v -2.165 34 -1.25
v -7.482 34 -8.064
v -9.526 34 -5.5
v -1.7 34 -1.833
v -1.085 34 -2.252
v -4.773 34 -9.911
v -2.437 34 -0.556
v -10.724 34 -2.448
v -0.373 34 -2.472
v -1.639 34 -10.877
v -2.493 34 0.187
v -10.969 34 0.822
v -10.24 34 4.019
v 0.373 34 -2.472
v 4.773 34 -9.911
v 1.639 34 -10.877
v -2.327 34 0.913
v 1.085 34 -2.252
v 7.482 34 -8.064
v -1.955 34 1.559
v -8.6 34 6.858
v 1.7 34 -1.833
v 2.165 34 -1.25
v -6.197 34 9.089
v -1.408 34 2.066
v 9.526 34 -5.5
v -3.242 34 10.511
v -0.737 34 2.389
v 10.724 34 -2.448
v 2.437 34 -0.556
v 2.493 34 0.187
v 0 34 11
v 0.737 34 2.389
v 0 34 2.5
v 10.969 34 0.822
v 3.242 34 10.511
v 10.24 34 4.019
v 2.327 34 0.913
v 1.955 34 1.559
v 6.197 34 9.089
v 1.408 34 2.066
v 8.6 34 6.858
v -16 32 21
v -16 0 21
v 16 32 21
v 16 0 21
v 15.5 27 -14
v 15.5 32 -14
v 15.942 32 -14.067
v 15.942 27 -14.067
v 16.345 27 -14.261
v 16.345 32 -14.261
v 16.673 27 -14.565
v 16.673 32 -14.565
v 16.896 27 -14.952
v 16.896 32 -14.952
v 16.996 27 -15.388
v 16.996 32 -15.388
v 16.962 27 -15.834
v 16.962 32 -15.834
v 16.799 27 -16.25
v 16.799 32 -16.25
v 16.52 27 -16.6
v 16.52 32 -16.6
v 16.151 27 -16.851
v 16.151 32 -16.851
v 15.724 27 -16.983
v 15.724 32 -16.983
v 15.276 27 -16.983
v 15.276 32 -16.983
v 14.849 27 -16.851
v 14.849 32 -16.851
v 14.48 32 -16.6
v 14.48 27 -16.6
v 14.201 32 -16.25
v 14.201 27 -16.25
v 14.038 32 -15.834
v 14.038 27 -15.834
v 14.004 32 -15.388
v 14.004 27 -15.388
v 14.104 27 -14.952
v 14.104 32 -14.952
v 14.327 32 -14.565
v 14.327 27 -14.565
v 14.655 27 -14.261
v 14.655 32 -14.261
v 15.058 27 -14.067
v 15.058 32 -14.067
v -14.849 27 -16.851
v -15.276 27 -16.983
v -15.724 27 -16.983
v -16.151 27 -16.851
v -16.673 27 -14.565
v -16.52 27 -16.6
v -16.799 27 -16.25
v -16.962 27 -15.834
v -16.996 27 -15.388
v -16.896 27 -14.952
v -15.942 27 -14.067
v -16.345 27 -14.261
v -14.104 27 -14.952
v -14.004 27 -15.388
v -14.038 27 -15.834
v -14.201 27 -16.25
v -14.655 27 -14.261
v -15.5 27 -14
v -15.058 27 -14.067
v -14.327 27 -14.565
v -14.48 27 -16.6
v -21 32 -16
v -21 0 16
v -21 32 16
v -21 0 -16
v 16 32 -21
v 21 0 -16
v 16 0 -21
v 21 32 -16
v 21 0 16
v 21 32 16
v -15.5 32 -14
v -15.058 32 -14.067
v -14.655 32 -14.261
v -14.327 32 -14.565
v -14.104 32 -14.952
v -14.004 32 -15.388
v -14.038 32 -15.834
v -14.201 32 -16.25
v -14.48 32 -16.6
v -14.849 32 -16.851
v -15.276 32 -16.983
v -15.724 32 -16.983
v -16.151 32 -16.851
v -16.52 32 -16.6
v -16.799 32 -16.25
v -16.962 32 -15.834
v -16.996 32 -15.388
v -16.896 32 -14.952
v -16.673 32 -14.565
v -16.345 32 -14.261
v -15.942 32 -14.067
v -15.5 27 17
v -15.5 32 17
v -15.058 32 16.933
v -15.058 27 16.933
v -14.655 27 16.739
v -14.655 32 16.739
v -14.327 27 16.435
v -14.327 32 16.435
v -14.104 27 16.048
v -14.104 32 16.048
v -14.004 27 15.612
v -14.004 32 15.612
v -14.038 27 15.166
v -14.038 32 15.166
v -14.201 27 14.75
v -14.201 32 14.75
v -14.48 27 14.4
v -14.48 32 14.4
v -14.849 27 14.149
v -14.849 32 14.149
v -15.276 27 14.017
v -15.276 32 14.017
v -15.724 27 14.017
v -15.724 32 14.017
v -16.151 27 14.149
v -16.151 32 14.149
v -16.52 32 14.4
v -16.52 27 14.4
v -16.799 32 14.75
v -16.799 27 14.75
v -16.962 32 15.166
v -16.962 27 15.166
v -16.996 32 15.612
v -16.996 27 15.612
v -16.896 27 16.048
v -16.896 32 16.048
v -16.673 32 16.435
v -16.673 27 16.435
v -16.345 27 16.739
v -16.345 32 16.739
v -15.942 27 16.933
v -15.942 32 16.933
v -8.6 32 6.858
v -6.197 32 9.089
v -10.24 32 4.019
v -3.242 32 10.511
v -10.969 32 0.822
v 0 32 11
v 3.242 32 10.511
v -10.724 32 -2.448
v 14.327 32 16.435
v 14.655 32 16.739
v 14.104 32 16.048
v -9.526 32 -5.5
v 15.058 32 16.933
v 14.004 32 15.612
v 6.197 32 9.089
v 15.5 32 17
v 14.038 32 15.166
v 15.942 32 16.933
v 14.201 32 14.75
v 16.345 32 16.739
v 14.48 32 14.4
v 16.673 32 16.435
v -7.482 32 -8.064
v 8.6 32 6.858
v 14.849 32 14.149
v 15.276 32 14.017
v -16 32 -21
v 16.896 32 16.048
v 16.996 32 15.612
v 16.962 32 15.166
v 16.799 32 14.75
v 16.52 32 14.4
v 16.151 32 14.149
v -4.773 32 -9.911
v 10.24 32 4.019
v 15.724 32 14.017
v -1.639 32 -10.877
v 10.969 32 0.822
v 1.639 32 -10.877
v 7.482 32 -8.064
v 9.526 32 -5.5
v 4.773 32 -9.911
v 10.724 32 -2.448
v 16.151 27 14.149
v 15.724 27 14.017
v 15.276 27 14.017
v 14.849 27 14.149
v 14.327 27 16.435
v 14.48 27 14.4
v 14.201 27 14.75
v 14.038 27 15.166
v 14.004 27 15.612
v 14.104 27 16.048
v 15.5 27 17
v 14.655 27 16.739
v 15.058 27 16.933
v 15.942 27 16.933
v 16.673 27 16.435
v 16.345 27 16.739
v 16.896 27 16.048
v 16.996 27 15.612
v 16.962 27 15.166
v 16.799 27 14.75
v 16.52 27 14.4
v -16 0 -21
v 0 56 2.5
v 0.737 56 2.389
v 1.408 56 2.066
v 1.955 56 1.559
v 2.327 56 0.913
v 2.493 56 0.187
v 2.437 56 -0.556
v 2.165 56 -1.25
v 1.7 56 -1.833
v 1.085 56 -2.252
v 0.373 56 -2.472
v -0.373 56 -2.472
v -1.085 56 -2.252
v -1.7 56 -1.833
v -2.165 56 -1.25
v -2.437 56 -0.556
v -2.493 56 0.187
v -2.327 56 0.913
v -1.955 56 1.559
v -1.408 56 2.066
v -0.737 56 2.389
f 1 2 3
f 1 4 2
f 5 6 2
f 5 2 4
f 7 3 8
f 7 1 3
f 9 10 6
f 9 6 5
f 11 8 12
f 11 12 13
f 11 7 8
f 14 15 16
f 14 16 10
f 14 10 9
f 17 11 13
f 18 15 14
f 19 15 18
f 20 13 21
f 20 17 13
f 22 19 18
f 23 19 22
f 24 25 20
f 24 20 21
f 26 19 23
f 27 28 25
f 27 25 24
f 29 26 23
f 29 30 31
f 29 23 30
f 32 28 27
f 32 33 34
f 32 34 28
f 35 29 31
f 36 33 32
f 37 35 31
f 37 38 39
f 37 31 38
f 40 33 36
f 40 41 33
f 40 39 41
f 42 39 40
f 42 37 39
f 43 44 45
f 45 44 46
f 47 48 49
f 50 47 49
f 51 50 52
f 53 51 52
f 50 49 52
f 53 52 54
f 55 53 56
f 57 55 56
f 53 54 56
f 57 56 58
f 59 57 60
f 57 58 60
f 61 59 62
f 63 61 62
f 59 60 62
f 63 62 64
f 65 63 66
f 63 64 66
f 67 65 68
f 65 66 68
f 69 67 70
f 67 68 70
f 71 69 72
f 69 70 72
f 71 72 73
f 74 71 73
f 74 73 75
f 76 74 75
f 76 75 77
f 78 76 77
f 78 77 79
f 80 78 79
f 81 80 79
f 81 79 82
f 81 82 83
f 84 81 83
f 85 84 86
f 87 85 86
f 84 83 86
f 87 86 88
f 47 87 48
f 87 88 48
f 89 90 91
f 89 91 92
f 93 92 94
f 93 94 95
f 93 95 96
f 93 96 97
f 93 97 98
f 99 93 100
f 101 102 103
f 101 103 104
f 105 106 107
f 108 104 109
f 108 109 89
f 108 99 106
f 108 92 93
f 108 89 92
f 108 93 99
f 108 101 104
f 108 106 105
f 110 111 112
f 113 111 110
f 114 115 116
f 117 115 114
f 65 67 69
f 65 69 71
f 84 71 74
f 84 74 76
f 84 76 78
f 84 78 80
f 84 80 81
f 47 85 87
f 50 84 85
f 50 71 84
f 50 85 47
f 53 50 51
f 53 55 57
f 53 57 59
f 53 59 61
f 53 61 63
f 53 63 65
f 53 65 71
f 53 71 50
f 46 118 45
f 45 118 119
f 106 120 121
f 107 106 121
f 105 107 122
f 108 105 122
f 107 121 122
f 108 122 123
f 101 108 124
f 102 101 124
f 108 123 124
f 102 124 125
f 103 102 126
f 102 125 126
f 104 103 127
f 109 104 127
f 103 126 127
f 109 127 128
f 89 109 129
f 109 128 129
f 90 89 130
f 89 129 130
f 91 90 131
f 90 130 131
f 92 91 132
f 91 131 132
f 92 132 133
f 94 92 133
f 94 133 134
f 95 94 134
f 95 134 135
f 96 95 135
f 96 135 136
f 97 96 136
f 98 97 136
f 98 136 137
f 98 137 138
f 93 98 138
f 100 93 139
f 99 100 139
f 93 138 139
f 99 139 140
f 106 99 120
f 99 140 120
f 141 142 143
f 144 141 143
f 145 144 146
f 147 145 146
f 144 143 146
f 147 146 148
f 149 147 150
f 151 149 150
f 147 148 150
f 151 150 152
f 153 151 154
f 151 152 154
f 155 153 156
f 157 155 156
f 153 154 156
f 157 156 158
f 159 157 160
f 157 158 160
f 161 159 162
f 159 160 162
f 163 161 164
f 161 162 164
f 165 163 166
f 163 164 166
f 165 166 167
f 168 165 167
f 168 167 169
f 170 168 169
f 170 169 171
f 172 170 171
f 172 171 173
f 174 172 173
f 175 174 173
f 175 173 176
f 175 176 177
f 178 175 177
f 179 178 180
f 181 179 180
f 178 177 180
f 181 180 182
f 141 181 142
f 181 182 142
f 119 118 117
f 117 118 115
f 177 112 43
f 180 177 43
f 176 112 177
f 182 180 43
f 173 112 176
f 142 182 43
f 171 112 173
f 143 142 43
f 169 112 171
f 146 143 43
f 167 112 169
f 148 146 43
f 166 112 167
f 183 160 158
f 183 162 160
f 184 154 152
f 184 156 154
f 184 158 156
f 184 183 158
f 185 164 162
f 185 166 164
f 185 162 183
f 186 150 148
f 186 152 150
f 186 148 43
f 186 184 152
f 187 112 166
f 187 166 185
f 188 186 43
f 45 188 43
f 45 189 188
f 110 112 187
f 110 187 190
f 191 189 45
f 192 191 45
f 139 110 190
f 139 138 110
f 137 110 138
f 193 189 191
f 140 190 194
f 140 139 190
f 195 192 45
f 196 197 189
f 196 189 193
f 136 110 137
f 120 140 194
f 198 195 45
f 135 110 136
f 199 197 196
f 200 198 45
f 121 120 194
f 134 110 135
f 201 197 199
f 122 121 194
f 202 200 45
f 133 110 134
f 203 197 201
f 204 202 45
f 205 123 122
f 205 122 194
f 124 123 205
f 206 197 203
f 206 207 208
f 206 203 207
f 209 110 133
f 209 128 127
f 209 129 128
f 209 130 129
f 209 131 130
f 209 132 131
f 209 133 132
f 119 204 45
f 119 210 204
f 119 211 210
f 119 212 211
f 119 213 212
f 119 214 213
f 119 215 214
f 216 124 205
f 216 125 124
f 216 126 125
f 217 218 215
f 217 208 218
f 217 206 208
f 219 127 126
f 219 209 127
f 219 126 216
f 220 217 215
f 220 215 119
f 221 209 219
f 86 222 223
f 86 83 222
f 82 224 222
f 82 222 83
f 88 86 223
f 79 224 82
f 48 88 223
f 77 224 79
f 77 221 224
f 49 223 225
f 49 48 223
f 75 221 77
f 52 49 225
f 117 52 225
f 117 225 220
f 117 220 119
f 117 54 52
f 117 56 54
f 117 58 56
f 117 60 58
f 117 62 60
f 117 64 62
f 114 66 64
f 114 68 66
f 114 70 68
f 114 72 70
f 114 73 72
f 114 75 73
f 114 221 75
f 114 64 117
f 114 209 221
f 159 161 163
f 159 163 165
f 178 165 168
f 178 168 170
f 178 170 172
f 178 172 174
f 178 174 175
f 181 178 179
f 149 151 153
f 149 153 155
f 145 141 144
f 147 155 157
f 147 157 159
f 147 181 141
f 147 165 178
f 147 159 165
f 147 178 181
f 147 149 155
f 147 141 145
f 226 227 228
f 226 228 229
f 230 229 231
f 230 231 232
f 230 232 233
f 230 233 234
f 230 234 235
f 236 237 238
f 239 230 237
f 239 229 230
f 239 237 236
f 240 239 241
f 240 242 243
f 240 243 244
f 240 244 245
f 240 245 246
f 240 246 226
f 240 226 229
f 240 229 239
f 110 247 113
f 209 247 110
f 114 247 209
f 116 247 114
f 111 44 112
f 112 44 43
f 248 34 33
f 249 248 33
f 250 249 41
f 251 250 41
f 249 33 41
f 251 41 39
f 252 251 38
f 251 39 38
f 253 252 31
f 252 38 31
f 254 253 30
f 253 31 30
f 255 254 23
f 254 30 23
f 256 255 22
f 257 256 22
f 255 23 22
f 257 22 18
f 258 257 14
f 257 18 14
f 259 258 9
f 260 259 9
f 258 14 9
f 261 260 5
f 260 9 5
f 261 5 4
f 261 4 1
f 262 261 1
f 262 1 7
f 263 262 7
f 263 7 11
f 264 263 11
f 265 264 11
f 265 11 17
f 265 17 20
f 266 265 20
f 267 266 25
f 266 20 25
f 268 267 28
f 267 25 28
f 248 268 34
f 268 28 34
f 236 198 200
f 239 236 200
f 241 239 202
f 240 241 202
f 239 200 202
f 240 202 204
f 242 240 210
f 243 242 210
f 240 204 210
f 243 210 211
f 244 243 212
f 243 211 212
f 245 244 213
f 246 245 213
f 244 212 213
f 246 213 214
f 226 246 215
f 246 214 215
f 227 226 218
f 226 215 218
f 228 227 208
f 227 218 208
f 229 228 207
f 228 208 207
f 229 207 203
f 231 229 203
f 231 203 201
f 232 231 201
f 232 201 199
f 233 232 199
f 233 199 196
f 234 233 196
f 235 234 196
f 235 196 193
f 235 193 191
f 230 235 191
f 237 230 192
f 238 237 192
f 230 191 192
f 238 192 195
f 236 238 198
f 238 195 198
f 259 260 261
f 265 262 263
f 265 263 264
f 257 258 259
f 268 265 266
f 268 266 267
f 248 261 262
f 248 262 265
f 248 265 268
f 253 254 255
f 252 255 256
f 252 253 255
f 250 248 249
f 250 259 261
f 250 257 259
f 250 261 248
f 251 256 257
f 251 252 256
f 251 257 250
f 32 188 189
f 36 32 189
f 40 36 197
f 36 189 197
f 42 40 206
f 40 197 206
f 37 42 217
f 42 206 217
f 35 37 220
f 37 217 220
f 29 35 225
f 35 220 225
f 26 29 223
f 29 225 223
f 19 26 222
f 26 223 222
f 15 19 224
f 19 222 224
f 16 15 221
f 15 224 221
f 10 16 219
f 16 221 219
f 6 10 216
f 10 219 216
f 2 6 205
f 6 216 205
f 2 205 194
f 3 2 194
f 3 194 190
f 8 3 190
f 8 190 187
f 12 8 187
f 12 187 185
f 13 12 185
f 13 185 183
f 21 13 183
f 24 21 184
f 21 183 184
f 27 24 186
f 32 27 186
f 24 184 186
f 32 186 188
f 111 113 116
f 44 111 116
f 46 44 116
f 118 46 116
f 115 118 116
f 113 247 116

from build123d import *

# Parameters (mm, degrees)
SKETCH1_W           = 42
SKETCH1_H           = 42
BOSS_EXTRUDE1_DEPTH = 32
SKETCH2_R           = 11
BOSS_EXTRUDE2_DEPTH = 2
SKETCH3_R           = 2.5
BOSS_EXTRUDE3_DEPTH = 22
SKETCH4_R           = 1.5
CUT_EXTRUDE1_DEPTH  = 5
CHAMFER1_SIZE       = 5


with BuildPart() as part:
    # Sketch1 → Boss-Extrude1 (new body)
    with BuildSketch(Plane(origin=(0, 0, 0), x_dir=(1, 0, 0), z_dir=(0, 1, 0))):
        Rectangle(SKETCH1_W, SKETCH1_H)
    extrude(amount=BOSS_EXTRUDE1_DEPTH)

    # Sketch2 → Boss-Extrude2 (add)
    with BuildSketch(Plane(origin=(0, 32, 0), x_dir=(1, 0, 0), z_dir=(0, 1, 0))):
        with Locations(Location((0, 0, 0), (0, 0, 270))):
            Circle(SKETCH2_R)
    extrude(amount=BOSS_EXTRUDE2_DEPTH)

    # Sketch3 → Boss-Extrude3 (add)
    with BuildSketch(Plane(origin=(0, 34, 0), x_dir=(1, 0, 0), z_dir=(0, 1, 0))):
        with Locations(Location((0, 0, 0), (0, 0, 270))):
            Circle(SKETCH3_R)
    extrude(amount=BOSS_EXTRUDE3_DEPTH)

    # Sketch4 → Cut-Extrude1 (cut)
    with BuildSketch(Plane(origin=(0, 32, 0), x_dir=(1, 0, 0), z_dir=(0, 1, 0))):
        with Locations(Location((15.5, 15.5, 0), (0, 0, 270))):
            Circle(SKETCH4_R)
        with Locations(Location((15.5, -15.5, 0), (0, 0, 270))):
            Circle(SKETCH4_R)
        with Locations(Location((-15.5, -15.5, 0), (0, 0, 270))):
            Circle(SKETCH4_R)
        with Locations(Location((-15.5, 15.5, 0), (0, 0, 270))):
            Circle(SKETCH4_R)
    extrude(amount=-CUT_EXTRUDE1_DEPTH, mode=Mode.SUBTRACT)

    # Chamfer1
    chamfer1_edges = [part.edges().sort_by_distance(p)[0] for p in [
        (21, 16, 21),
        (-21, 16, 21),
        (-21, 16, -21),
        (21, 16, -21),
    ]]
    chamfer(chamfer1_edges, length=CHAMFER1_SIZE)


solid = part.part
